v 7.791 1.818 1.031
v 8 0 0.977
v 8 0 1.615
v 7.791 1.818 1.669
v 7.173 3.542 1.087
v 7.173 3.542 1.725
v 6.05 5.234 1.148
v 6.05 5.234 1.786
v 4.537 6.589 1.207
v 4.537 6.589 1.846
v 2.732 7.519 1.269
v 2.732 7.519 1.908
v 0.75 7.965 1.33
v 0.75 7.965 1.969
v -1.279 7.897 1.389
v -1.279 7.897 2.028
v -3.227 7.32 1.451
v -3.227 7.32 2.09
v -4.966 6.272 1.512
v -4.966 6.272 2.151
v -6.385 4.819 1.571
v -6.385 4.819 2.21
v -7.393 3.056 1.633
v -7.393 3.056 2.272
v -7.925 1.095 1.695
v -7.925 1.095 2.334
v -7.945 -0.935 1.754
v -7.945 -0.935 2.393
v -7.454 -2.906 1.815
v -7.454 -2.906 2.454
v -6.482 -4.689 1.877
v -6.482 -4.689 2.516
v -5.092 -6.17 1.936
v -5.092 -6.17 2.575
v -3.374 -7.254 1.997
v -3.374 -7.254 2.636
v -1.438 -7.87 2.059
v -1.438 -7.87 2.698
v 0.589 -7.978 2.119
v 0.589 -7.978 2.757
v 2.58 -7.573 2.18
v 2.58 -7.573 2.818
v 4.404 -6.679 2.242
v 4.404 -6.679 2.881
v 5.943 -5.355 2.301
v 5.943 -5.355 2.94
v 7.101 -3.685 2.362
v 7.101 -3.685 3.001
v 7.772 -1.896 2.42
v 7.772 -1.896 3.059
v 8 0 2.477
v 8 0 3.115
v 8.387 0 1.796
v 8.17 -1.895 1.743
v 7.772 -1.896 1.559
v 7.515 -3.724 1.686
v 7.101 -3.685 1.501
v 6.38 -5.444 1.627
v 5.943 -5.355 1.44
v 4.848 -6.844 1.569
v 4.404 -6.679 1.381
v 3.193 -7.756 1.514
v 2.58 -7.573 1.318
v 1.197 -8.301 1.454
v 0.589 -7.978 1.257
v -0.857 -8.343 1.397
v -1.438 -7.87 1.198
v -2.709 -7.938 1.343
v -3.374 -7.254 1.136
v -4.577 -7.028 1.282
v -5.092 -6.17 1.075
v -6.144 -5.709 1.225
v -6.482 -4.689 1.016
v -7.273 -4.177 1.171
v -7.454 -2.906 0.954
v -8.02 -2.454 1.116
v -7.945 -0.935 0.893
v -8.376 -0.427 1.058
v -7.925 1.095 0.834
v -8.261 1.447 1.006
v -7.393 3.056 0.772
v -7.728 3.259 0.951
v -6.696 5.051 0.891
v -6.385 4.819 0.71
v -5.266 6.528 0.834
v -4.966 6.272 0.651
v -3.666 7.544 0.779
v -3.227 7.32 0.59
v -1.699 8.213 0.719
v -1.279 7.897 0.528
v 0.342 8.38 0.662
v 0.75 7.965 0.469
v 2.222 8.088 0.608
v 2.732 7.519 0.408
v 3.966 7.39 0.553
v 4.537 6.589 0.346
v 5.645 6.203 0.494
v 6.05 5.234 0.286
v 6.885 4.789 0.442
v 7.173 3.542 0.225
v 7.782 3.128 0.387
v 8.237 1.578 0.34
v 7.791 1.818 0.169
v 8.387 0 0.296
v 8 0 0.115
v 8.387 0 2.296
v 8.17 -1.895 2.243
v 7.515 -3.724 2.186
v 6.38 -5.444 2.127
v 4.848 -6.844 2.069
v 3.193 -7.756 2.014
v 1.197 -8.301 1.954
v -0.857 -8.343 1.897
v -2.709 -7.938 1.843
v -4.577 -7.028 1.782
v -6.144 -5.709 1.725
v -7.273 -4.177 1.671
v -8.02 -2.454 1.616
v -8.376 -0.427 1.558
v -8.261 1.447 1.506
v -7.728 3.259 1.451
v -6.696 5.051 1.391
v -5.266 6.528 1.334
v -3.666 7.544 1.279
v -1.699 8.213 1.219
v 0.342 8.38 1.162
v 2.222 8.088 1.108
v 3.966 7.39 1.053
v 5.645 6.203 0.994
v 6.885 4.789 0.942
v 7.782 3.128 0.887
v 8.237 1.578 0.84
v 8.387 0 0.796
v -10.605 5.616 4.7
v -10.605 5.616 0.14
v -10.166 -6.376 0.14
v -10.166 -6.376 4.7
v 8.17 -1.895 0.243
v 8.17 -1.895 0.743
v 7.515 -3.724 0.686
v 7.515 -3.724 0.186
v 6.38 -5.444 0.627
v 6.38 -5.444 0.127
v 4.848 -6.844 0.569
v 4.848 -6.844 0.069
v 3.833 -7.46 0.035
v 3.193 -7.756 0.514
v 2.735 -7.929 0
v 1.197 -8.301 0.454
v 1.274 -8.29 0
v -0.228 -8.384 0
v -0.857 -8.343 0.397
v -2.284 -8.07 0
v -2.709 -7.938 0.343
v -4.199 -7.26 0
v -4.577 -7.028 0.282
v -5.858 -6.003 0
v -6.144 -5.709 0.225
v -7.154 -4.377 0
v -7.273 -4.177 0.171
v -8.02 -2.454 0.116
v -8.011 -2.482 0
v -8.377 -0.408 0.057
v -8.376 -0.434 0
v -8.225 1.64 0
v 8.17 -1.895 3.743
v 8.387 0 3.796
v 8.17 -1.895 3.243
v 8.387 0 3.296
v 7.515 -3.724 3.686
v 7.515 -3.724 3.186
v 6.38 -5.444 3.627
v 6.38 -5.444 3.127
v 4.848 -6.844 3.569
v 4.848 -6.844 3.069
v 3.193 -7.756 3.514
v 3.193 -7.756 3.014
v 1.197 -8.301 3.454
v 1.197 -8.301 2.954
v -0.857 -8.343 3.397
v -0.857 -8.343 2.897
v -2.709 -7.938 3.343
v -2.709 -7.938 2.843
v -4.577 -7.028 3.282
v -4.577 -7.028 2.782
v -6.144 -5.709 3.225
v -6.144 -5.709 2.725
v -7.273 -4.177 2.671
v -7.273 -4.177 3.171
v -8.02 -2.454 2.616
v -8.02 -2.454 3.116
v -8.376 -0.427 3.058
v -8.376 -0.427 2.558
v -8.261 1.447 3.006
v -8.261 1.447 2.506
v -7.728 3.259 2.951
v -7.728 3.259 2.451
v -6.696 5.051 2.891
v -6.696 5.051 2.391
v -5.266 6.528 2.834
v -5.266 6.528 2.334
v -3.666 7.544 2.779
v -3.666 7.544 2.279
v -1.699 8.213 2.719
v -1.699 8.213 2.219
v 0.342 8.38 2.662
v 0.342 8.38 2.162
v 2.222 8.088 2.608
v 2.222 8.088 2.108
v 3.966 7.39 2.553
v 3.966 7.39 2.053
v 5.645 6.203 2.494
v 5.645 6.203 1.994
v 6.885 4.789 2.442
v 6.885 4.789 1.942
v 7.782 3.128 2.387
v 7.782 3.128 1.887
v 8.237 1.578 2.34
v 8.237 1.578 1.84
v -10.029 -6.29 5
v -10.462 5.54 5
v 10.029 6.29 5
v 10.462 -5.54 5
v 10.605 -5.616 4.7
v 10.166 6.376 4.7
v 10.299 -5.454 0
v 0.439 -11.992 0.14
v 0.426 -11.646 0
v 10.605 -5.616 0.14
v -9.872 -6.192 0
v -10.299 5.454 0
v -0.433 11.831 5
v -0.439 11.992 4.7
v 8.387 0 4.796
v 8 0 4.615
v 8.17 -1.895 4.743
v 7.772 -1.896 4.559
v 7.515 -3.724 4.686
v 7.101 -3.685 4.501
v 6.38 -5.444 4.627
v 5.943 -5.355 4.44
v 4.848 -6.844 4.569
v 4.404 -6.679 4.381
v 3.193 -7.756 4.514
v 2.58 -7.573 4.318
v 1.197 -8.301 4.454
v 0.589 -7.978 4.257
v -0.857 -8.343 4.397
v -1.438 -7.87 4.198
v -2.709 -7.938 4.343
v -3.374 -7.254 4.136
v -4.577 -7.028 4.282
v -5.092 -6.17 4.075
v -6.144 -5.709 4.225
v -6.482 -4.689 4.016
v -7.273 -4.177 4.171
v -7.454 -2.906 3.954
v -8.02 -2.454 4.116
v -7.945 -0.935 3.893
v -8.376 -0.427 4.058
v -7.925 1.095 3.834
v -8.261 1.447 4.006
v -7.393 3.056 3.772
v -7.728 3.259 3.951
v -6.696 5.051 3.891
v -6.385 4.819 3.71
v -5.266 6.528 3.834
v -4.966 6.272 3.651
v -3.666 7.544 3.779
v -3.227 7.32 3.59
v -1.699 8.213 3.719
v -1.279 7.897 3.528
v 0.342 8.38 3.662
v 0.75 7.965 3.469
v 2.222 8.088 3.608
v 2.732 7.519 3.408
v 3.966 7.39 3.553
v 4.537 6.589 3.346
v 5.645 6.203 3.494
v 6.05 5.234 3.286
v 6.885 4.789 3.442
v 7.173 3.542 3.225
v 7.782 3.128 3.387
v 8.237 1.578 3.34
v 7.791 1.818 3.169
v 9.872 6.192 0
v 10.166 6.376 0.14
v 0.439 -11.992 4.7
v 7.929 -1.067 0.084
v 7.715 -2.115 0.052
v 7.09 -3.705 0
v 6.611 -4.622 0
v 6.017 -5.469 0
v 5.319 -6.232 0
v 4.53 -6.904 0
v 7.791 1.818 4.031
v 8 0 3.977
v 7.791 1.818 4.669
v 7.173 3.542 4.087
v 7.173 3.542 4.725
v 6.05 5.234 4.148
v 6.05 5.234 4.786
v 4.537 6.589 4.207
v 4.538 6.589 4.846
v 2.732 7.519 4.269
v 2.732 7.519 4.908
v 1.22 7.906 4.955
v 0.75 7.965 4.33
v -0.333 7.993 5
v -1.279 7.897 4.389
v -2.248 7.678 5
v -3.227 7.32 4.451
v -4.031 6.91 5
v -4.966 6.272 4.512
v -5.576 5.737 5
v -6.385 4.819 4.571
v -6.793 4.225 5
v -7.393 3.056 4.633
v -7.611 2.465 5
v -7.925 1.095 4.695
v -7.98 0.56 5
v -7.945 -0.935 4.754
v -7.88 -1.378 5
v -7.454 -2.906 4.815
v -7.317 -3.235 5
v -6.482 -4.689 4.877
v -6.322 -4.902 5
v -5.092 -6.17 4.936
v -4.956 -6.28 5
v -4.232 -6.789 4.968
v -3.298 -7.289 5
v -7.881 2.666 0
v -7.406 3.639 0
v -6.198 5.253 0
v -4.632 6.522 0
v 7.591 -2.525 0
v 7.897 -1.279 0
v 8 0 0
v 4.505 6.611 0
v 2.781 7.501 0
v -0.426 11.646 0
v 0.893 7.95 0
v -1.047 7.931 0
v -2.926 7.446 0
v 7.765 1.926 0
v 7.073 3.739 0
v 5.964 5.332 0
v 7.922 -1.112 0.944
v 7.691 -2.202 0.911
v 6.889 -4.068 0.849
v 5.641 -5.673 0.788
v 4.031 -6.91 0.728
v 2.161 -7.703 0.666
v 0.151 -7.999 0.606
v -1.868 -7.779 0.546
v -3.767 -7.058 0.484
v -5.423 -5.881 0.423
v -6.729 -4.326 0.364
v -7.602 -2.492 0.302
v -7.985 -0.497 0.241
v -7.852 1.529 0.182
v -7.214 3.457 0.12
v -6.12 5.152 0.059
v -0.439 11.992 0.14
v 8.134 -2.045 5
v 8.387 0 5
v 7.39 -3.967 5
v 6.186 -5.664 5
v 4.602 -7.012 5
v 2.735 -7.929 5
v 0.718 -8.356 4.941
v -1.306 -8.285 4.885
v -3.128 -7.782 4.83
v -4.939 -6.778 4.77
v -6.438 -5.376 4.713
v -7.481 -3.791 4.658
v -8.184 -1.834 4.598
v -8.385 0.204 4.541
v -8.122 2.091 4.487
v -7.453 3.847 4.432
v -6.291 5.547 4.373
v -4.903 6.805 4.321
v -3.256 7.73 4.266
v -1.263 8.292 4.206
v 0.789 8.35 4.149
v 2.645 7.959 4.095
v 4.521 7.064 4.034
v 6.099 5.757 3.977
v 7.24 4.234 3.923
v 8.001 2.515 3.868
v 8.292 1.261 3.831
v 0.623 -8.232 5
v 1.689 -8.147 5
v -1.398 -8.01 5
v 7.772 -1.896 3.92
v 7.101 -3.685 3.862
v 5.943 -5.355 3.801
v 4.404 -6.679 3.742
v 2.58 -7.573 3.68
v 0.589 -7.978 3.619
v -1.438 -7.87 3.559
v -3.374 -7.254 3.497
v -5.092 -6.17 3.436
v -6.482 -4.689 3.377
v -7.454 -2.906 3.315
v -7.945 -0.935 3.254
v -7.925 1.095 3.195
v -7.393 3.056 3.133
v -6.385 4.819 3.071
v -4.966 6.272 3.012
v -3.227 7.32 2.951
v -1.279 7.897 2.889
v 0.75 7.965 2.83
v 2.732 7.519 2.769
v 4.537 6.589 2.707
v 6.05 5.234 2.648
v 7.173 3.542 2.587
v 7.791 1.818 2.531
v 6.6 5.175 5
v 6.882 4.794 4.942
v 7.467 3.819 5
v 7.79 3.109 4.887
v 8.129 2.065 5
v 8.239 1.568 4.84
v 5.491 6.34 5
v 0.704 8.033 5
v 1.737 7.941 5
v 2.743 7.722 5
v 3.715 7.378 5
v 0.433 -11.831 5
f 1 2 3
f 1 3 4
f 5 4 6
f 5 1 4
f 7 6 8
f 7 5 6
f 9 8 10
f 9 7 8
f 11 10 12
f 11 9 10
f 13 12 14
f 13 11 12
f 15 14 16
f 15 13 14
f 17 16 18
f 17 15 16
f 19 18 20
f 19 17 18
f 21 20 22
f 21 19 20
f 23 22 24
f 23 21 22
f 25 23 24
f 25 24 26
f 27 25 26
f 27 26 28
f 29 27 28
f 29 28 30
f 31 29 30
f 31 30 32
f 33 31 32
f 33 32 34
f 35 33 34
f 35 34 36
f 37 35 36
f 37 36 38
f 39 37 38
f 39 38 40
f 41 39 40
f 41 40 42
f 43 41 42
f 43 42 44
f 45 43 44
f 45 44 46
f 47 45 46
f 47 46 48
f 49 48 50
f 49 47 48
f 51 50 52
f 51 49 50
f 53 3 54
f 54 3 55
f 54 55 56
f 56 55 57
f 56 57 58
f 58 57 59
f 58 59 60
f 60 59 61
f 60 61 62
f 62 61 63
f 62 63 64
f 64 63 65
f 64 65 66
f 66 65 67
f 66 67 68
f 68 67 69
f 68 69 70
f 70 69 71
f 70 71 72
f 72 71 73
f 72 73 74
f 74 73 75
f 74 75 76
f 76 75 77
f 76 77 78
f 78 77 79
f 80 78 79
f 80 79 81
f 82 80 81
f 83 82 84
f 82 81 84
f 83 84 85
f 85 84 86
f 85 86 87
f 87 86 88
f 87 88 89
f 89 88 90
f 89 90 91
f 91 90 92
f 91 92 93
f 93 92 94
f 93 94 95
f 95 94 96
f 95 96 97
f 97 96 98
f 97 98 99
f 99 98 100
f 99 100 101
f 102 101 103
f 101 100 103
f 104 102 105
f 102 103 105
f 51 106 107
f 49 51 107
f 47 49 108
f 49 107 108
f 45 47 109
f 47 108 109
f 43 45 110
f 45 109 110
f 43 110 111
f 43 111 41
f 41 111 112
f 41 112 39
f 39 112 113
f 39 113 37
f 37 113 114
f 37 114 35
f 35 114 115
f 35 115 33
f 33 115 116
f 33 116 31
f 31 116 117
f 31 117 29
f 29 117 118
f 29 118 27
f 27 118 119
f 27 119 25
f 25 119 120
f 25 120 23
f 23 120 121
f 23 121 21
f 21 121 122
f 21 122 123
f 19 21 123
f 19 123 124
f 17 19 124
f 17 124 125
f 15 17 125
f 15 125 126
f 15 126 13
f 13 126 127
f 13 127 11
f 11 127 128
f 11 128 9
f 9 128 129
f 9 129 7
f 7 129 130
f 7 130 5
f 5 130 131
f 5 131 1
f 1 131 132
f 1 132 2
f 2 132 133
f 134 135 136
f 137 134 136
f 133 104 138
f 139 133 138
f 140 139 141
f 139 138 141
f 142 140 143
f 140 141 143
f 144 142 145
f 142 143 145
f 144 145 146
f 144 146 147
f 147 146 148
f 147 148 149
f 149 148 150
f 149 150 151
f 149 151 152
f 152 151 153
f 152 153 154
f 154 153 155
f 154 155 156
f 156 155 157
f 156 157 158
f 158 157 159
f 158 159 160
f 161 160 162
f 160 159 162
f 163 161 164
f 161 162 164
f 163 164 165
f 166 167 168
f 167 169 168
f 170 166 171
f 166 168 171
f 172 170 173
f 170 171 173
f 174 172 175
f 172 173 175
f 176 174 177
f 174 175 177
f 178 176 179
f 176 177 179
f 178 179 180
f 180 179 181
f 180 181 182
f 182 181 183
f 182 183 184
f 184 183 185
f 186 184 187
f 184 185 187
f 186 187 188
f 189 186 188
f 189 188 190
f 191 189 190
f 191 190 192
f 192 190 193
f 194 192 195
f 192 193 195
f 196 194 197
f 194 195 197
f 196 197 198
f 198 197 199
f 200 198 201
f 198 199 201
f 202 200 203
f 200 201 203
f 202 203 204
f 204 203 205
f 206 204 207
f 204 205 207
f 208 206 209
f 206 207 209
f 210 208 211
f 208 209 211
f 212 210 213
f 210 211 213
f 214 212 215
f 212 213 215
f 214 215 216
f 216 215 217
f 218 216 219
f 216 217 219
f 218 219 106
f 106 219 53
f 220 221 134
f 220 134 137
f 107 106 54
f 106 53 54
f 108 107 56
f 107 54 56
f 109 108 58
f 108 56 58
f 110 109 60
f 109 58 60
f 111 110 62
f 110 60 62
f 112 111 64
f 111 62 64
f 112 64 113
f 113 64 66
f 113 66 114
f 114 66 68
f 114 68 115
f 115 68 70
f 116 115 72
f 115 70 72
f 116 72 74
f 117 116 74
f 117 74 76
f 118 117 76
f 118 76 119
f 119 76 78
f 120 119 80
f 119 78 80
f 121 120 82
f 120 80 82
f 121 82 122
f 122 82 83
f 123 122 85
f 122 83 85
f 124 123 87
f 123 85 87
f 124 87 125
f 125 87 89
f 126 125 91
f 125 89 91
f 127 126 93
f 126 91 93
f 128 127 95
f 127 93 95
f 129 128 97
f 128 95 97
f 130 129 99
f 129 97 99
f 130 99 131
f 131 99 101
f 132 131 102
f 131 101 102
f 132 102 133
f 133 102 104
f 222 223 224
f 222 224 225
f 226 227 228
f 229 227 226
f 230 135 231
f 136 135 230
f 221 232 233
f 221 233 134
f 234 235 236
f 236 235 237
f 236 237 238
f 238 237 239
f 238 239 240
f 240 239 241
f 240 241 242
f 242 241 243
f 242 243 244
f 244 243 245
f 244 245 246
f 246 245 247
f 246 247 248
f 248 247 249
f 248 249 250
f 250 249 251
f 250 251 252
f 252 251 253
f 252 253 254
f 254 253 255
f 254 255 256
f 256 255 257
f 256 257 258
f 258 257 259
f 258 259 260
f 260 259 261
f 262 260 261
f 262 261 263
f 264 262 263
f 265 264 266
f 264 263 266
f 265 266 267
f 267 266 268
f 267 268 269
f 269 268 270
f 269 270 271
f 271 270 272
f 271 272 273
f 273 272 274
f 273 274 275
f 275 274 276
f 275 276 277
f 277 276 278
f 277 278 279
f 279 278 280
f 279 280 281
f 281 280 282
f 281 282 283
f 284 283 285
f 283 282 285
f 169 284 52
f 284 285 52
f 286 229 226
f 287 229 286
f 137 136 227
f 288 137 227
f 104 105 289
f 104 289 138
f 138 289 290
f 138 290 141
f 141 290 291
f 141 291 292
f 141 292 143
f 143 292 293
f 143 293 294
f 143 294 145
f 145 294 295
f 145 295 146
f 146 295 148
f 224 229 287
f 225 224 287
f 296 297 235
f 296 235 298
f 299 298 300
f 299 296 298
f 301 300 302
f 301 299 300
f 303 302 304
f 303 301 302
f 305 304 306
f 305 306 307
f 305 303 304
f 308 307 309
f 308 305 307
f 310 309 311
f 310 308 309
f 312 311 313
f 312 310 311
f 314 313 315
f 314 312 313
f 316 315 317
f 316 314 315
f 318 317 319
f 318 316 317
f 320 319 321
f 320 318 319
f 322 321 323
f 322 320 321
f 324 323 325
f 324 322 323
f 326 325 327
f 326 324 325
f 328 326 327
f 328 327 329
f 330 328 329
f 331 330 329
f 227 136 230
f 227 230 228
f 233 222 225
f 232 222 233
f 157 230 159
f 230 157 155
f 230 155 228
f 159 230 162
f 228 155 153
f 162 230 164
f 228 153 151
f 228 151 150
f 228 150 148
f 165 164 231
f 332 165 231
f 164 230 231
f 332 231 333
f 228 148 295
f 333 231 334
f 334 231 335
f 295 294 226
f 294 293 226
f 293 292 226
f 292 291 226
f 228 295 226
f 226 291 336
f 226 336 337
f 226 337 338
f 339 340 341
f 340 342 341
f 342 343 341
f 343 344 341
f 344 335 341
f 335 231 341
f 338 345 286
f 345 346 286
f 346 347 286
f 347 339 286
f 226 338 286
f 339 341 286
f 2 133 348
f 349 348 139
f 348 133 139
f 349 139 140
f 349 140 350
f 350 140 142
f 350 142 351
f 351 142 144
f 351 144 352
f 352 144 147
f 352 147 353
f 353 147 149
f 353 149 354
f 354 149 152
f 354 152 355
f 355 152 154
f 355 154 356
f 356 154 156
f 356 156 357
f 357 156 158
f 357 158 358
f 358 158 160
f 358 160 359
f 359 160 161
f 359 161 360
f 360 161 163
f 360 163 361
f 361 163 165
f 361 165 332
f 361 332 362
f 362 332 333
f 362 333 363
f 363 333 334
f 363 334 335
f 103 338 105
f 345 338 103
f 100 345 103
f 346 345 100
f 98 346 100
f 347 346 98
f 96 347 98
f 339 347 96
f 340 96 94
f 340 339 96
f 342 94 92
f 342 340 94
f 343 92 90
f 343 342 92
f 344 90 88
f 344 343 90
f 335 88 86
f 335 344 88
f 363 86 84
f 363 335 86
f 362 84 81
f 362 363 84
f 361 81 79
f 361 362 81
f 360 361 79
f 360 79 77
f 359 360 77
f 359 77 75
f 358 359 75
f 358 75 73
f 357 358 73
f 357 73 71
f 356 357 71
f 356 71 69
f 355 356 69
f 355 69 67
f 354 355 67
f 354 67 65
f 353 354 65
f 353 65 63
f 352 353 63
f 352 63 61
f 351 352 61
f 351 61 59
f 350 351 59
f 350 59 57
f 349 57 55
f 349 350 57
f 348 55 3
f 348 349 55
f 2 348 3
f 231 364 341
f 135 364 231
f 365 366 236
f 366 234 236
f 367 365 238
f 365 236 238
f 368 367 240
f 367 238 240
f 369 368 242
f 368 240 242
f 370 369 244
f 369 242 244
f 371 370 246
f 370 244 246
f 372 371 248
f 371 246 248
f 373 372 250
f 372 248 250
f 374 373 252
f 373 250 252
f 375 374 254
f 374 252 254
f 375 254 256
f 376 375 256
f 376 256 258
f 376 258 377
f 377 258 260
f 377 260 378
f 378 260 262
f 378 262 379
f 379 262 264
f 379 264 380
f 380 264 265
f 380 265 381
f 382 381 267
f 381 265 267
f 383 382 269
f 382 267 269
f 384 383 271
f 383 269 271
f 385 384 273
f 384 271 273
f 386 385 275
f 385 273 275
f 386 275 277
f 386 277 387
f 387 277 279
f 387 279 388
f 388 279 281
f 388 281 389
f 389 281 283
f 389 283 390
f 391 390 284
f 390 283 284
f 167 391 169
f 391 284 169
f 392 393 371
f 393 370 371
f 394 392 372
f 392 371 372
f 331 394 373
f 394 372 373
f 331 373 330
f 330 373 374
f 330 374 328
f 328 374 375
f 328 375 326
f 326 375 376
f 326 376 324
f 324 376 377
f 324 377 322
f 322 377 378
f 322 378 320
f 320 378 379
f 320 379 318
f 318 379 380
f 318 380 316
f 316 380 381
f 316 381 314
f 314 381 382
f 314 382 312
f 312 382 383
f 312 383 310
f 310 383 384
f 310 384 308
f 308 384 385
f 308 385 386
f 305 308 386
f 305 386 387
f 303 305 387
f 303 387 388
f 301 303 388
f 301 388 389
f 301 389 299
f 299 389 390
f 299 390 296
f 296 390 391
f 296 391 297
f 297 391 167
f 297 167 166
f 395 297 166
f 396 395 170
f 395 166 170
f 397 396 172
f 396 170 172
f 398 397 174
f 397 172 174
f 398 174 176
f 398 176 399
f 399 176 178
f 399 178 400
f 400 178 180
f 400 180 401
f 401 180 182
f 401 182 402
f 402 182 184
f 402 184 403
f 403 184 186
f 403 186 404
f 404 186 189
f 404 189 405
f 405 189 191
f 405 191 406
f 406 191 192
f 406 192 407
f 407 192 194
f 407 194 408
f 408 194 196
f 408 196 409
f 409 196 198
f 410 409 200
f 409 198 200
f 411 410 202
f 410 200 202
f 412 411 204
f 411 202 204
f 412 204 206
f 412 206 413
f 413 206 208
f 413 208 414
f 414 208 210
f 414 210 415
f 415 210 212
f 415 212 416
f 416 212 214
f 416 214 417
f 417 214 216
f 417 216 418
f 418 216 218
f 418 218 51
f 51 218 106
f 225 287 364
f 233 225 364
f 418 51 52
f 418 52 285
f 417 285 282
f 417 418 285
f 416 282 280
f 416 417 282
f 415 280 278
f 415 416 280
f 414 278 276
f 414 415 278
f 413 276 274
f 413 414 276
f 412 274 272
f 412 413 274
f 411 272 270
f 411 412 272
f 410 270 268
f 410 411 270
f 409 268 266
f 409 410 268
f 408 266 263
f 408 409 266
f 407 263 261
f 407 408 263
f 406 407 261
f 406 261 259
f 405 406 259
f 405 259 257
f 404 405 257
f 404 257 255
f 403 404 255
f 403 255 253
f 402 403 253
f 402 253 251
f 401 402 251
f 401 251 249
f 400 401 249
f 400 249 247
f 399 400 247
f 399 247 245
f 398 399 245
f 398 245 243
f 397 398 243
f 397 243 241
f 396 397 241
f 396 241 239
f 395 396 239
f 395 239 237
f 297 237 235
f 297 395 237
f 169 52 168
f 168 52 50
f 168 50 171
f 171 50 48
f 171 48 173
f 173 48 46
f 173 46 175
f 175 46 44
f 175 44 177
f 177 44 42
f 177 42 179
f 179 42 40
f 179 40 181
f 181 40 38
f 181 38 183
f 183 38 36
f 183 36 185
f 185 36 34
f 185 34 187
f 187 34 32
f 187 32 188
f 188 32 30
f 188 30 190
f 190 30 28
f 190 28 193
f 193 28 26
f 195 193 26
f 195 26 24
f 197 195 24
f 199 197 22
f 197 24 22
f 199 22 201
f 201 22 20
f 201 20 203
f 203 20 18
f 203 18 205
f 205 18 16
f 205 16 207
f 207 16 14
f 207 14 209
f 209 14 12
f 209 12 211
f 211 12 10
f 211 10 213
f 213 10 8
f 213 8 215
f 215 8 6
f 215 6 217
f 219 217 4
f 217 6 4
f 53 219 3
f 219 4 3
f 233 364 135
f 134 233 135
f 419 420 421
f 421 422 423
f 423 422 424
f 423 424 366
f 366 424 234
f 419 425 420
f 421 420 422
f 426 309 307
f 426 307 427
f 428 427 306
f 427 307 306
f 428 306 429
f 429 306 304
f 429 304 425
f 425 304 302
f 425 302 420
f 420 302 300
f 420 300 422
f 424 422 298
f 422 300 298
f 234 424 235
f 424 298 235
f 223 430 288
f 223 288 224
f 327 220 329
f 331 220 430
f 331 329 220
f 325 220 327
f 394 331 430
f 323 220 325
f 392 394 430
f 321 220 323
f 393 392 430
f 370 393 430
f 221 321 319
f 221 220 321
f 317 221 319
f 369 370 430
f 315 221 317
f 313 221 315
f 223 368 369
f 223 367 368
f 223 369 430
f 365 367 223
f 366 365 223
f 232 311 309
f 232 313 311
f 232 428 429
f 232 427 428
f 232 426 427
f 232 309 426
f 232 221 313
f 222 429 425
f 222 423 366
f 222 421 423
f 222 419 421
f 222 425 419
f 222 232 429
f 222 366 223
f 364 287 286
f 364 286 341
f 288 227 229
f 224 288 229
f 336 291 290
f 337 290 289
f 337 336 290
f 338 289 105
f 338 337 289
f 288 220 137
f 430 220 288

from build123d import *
from OCP.BRepFilletAPI import BRepFilletAPI_MakeChamfer

# Parameters (mm, degrees)
SKETCH1_R           = 8
BOSS_EXTRUDE1_DEPTH = 5
CUT_SWEEP1_PITCH    = 1.5
CHAMFER1_SIZE       = 0.3
CHAMFER1_SIZE2      = 0.139892297


with BuildPart() as part:
    # Sketch1 → Boss-Extrude1 (new body)
    with BuildSketch(Plane.XY):
        Polygon((10.165837862, 6.376185425), (-0.439019626, 11.991966551), (-10.604857488, 5.615781126), (-10.165837862, -6.376185425), (0.439019626, -11.991966551), (10.604857488, -5.615781126), align=None)
        Circle(SKETCH1_R, mode=Mode.SUBTRACT)
    extrude(amount=BOSS_EXTRUDE1_DEPTH)

    # Cut-Sweep1: arcs per turn and ends read off the stored shape
    # Cut-Sweep1: the profile of Sketch3 screwed along a right-hand helix through 5 turns, 8 arcs to a turn; built about Z, then put on its axis
    cut_sweep1_z = Axis((0, 0, 0), (0, 0, 1))
    cut_sweep1_corners = [(7.851099618, 5.3441e-05, -1.046060596), (7.851099618, 5.3441e-05, -2.046060596), (8.387226348, 5.709e-05, -1.796060596), (8.387226348, 5.709e-05, -1.296060596)]
    with BuildLine(mode=Mode.PRIVATE) as cut_sweep1_profile:
        Line(cut_sweep1_corners[0], cut_sweep1_corners[1])
        Line(cut_sweep1_corners[1], cut_sweep1_corners[2])
        Line(cut_sweep1_corners[2], cut_sweep1_corners[3])
        Line(cut_sweep1_corners[3], cut_sweep1_corners[0])
    cut_sweep1_cap = Face(cut_sweep1_profile.wire())
    cut_sweep1_turn_angles = [0, 22.5, 45, 67.5, 90, 112.5, 135, 157.5, 180, 202.5, 225, 247.5, 270, 292.5, 315, 337.5, 360]
    cut_sweep1_turn_weights = [1, 0.9238795325112867, 1, 0.9238795325112867, 1, 0.9238795325112867, 1, 0.9238795325112867, 1, 0.9238795325112867, 1, 0.9238795325112867, 1, 0.9238795325112867, 1, 0.9238795325112867, 1]
    cut_sweep1_turn_rails = [Edge.make_bspline([Vector(p[0], p[1], 0).rotate(cut_sweep1_z, cut_sweep1_turn_angles[k]) / cut_sweep1_turn_weights[k] + Vector(0, 0, p[2] + CUT_SWEEP1_PITCH * cut_sweep1_turn_angles[k] / 360) for k in range(17)], [0, 0, 0, 1, 1, 2, 2, 3, 3, 4, 4, 5, 5, 6, 6, 7, 7, 8, 8, 8], 2, cut_sweep1_turn_weights) for p in cut_sweep1_corners]
    cut_sweep1_turn_sides = [Face.make_surface_from_curves(cut_sweep1_turn_rails[p[0]], cut_sweep1_turn_rails[p[1]]) for p in [(0, 1), (1, 2), (2, 3), (3, 0)]]
    cut_sweep1 = Plane(origin=(0, 0, 5), x_dir=(1, 0, 0), z_dir=(0, 0, -1)) * Solid(Shell([*[p.moved(Location((0, 0, CUT_SWEEP1_PITCH * i))) for i in range(5) for p in cut_sweep1_turn_sides], cut_sweep1_cap, cut_sweep1_cap.rotate(cut_sweep1_z, 1800).moved(Location((0, 0, CUT_SWEEP1_PITCH * 1800 / 360)))]))
    add(cut_sweep1, mode=Mode.SUBTRACT)

    # Chamfer1: one chamfer whose edges measure the first distance from different faces: ONE call of the kernel's chamfer builder (chamfer() names one face for all edges)
    chamfer1_edges_1 = [part.edges().sort_by_distance(p)[0] for p in [
        (-5.521938557, 8.803873839, 5),
    ]]
    chamfer1_side_1 = [part.faces().sort_by_distance(p)[0] for p in [
        (-5.521938557, 8.803873839, 2.5),
    ]]
    chamfer1_edges_2 = [part.edges().sort_by_distance(p)[0] for p in [
        (-10.385347675, -0.380202149, 5),
    ]]
    chamfer1_side_2 = [part.faces().sort_by_distance(p)[0] for p in [
        (-10.385347675, -0.380202149, 2.5),
    ]]
    chamfer1_edges_3 = [part.edges().sort_by_distance(p)[0] for p in [
        (-4.863409118, -9.184075988, 5),
    ]]
    chamfer1_side_3 = [part.faces().sort_by_distance(p)[0] for p in [
        (-4.863409118, -9.184075988, 2.5),
    ]]
    chamfer1_edges_4 = [part.edges().sort_by_distance(p)[0] for p in [
        (5.521938557, -8.803873839, 5),
    ]]
    chamfer1_side_4 = [part.faces().sort_by_distance(p)[0] for p in [
        (5.521938557, -8.803873839, 2.5),
    ]]
    chamfer1_edges_5 = [part.edges().sort_by_distance(p)[0] for p in [
        (10.385347675, 0.380202149, 5),
    ]]
    chamfer1_side_5 = [part.faces().sort_by_distance(p)[0] for p in [
        (10.385347675, 0.380202149, 2.5),
    ]]
    chamfer1_edges_6 = [part.edges().sort_by_distance(p)[0] for p in [
        (5.521938557, -8.803873839, 0),
        (-4.863409118, -9.184075988, 0),
        (-10.385347675, -0.380202149, 0),
        (-5.521938557, 8.803873839, 0),
        (4.863409118, 9.184075988, 0),
        (10.385347675, 0.380202149, 0),
    ]]
    chamfer1_side_6 = [part.faces().sort_by_distance(p)[0] for p in [
        (4.713575925, 8.901130549, 0),
    ]]
    chamfer1_edges_7 = [part.edges().sort_by_distance(p)[0] for p in [
        (4.863409118, 9.184075988, 5),
    ]]
    chamfer1_side_7 = [part.faces().sort_by_distance(p)[0] for p in [
        (4.863409118, 9.184075988, 2.5),
    ]]
    chamfer1 = BRepFilletAPI_MakeChamfer(part.part.solid().wrapped)
    for e in chamfer1_edges_1:
        chamfer1.Add(CHAMFER1_SIZE, CHAMFER1_SIZE2, e.wrapped, chamfer1_side_1[0].wrapped)  # the first distance lies on this face
    for e in chamfer1_edges_2:
        chamfer1.Add(CHAMFER1_SIZE, CHAMFER1_SIZE2, e.wrapped, chamfer1_side_2[0].wrapped)  # the first distance lies on this face
    for e in chamfer1_edges_3:
        chamfer1.Add(CHAMFER1_SIZE, CHAMFER1_SIZE2, e.wrapped, chamfer1_side_3[0].wrapped)  # the first distance lies on this face
    for e in chamfer1_edges_4:
        chamfer1.Add(CHAMFER1_SIZE, CHAMFER1_SIZE2, e.wrapped, chamfer1_side_4[0].wrapped)  # the first distance lies on this face
    for e in chamfer1_edges_5:
        chamfer1.Add(CHAMFER1_SIZE, CHAMFER1_SIZE2, e.wrapped, chamfer1_side_5[0].wrapped)  # the first distance lies on this face
    for e in chamfer1_edges_6:
        chamfer1.Add(CHAMFER1_SIZE, CHAMFER1_SIZE2, e.wrapped, chamfer1_side_6[0].wrapped)  # the first distance lies on this face
    for e in chamfer1_edges_7:
        chamfer1.Add(CHAMFER1_SIZE, CHAMFER1_SIZE2, e.wrapped, chamfer1_side_7[0].wrapped)  # the first distance lies on this face
    add(Compound.cast(chamfer1.Shape()), mode=Mode.REPLACE)


solid = part.part
